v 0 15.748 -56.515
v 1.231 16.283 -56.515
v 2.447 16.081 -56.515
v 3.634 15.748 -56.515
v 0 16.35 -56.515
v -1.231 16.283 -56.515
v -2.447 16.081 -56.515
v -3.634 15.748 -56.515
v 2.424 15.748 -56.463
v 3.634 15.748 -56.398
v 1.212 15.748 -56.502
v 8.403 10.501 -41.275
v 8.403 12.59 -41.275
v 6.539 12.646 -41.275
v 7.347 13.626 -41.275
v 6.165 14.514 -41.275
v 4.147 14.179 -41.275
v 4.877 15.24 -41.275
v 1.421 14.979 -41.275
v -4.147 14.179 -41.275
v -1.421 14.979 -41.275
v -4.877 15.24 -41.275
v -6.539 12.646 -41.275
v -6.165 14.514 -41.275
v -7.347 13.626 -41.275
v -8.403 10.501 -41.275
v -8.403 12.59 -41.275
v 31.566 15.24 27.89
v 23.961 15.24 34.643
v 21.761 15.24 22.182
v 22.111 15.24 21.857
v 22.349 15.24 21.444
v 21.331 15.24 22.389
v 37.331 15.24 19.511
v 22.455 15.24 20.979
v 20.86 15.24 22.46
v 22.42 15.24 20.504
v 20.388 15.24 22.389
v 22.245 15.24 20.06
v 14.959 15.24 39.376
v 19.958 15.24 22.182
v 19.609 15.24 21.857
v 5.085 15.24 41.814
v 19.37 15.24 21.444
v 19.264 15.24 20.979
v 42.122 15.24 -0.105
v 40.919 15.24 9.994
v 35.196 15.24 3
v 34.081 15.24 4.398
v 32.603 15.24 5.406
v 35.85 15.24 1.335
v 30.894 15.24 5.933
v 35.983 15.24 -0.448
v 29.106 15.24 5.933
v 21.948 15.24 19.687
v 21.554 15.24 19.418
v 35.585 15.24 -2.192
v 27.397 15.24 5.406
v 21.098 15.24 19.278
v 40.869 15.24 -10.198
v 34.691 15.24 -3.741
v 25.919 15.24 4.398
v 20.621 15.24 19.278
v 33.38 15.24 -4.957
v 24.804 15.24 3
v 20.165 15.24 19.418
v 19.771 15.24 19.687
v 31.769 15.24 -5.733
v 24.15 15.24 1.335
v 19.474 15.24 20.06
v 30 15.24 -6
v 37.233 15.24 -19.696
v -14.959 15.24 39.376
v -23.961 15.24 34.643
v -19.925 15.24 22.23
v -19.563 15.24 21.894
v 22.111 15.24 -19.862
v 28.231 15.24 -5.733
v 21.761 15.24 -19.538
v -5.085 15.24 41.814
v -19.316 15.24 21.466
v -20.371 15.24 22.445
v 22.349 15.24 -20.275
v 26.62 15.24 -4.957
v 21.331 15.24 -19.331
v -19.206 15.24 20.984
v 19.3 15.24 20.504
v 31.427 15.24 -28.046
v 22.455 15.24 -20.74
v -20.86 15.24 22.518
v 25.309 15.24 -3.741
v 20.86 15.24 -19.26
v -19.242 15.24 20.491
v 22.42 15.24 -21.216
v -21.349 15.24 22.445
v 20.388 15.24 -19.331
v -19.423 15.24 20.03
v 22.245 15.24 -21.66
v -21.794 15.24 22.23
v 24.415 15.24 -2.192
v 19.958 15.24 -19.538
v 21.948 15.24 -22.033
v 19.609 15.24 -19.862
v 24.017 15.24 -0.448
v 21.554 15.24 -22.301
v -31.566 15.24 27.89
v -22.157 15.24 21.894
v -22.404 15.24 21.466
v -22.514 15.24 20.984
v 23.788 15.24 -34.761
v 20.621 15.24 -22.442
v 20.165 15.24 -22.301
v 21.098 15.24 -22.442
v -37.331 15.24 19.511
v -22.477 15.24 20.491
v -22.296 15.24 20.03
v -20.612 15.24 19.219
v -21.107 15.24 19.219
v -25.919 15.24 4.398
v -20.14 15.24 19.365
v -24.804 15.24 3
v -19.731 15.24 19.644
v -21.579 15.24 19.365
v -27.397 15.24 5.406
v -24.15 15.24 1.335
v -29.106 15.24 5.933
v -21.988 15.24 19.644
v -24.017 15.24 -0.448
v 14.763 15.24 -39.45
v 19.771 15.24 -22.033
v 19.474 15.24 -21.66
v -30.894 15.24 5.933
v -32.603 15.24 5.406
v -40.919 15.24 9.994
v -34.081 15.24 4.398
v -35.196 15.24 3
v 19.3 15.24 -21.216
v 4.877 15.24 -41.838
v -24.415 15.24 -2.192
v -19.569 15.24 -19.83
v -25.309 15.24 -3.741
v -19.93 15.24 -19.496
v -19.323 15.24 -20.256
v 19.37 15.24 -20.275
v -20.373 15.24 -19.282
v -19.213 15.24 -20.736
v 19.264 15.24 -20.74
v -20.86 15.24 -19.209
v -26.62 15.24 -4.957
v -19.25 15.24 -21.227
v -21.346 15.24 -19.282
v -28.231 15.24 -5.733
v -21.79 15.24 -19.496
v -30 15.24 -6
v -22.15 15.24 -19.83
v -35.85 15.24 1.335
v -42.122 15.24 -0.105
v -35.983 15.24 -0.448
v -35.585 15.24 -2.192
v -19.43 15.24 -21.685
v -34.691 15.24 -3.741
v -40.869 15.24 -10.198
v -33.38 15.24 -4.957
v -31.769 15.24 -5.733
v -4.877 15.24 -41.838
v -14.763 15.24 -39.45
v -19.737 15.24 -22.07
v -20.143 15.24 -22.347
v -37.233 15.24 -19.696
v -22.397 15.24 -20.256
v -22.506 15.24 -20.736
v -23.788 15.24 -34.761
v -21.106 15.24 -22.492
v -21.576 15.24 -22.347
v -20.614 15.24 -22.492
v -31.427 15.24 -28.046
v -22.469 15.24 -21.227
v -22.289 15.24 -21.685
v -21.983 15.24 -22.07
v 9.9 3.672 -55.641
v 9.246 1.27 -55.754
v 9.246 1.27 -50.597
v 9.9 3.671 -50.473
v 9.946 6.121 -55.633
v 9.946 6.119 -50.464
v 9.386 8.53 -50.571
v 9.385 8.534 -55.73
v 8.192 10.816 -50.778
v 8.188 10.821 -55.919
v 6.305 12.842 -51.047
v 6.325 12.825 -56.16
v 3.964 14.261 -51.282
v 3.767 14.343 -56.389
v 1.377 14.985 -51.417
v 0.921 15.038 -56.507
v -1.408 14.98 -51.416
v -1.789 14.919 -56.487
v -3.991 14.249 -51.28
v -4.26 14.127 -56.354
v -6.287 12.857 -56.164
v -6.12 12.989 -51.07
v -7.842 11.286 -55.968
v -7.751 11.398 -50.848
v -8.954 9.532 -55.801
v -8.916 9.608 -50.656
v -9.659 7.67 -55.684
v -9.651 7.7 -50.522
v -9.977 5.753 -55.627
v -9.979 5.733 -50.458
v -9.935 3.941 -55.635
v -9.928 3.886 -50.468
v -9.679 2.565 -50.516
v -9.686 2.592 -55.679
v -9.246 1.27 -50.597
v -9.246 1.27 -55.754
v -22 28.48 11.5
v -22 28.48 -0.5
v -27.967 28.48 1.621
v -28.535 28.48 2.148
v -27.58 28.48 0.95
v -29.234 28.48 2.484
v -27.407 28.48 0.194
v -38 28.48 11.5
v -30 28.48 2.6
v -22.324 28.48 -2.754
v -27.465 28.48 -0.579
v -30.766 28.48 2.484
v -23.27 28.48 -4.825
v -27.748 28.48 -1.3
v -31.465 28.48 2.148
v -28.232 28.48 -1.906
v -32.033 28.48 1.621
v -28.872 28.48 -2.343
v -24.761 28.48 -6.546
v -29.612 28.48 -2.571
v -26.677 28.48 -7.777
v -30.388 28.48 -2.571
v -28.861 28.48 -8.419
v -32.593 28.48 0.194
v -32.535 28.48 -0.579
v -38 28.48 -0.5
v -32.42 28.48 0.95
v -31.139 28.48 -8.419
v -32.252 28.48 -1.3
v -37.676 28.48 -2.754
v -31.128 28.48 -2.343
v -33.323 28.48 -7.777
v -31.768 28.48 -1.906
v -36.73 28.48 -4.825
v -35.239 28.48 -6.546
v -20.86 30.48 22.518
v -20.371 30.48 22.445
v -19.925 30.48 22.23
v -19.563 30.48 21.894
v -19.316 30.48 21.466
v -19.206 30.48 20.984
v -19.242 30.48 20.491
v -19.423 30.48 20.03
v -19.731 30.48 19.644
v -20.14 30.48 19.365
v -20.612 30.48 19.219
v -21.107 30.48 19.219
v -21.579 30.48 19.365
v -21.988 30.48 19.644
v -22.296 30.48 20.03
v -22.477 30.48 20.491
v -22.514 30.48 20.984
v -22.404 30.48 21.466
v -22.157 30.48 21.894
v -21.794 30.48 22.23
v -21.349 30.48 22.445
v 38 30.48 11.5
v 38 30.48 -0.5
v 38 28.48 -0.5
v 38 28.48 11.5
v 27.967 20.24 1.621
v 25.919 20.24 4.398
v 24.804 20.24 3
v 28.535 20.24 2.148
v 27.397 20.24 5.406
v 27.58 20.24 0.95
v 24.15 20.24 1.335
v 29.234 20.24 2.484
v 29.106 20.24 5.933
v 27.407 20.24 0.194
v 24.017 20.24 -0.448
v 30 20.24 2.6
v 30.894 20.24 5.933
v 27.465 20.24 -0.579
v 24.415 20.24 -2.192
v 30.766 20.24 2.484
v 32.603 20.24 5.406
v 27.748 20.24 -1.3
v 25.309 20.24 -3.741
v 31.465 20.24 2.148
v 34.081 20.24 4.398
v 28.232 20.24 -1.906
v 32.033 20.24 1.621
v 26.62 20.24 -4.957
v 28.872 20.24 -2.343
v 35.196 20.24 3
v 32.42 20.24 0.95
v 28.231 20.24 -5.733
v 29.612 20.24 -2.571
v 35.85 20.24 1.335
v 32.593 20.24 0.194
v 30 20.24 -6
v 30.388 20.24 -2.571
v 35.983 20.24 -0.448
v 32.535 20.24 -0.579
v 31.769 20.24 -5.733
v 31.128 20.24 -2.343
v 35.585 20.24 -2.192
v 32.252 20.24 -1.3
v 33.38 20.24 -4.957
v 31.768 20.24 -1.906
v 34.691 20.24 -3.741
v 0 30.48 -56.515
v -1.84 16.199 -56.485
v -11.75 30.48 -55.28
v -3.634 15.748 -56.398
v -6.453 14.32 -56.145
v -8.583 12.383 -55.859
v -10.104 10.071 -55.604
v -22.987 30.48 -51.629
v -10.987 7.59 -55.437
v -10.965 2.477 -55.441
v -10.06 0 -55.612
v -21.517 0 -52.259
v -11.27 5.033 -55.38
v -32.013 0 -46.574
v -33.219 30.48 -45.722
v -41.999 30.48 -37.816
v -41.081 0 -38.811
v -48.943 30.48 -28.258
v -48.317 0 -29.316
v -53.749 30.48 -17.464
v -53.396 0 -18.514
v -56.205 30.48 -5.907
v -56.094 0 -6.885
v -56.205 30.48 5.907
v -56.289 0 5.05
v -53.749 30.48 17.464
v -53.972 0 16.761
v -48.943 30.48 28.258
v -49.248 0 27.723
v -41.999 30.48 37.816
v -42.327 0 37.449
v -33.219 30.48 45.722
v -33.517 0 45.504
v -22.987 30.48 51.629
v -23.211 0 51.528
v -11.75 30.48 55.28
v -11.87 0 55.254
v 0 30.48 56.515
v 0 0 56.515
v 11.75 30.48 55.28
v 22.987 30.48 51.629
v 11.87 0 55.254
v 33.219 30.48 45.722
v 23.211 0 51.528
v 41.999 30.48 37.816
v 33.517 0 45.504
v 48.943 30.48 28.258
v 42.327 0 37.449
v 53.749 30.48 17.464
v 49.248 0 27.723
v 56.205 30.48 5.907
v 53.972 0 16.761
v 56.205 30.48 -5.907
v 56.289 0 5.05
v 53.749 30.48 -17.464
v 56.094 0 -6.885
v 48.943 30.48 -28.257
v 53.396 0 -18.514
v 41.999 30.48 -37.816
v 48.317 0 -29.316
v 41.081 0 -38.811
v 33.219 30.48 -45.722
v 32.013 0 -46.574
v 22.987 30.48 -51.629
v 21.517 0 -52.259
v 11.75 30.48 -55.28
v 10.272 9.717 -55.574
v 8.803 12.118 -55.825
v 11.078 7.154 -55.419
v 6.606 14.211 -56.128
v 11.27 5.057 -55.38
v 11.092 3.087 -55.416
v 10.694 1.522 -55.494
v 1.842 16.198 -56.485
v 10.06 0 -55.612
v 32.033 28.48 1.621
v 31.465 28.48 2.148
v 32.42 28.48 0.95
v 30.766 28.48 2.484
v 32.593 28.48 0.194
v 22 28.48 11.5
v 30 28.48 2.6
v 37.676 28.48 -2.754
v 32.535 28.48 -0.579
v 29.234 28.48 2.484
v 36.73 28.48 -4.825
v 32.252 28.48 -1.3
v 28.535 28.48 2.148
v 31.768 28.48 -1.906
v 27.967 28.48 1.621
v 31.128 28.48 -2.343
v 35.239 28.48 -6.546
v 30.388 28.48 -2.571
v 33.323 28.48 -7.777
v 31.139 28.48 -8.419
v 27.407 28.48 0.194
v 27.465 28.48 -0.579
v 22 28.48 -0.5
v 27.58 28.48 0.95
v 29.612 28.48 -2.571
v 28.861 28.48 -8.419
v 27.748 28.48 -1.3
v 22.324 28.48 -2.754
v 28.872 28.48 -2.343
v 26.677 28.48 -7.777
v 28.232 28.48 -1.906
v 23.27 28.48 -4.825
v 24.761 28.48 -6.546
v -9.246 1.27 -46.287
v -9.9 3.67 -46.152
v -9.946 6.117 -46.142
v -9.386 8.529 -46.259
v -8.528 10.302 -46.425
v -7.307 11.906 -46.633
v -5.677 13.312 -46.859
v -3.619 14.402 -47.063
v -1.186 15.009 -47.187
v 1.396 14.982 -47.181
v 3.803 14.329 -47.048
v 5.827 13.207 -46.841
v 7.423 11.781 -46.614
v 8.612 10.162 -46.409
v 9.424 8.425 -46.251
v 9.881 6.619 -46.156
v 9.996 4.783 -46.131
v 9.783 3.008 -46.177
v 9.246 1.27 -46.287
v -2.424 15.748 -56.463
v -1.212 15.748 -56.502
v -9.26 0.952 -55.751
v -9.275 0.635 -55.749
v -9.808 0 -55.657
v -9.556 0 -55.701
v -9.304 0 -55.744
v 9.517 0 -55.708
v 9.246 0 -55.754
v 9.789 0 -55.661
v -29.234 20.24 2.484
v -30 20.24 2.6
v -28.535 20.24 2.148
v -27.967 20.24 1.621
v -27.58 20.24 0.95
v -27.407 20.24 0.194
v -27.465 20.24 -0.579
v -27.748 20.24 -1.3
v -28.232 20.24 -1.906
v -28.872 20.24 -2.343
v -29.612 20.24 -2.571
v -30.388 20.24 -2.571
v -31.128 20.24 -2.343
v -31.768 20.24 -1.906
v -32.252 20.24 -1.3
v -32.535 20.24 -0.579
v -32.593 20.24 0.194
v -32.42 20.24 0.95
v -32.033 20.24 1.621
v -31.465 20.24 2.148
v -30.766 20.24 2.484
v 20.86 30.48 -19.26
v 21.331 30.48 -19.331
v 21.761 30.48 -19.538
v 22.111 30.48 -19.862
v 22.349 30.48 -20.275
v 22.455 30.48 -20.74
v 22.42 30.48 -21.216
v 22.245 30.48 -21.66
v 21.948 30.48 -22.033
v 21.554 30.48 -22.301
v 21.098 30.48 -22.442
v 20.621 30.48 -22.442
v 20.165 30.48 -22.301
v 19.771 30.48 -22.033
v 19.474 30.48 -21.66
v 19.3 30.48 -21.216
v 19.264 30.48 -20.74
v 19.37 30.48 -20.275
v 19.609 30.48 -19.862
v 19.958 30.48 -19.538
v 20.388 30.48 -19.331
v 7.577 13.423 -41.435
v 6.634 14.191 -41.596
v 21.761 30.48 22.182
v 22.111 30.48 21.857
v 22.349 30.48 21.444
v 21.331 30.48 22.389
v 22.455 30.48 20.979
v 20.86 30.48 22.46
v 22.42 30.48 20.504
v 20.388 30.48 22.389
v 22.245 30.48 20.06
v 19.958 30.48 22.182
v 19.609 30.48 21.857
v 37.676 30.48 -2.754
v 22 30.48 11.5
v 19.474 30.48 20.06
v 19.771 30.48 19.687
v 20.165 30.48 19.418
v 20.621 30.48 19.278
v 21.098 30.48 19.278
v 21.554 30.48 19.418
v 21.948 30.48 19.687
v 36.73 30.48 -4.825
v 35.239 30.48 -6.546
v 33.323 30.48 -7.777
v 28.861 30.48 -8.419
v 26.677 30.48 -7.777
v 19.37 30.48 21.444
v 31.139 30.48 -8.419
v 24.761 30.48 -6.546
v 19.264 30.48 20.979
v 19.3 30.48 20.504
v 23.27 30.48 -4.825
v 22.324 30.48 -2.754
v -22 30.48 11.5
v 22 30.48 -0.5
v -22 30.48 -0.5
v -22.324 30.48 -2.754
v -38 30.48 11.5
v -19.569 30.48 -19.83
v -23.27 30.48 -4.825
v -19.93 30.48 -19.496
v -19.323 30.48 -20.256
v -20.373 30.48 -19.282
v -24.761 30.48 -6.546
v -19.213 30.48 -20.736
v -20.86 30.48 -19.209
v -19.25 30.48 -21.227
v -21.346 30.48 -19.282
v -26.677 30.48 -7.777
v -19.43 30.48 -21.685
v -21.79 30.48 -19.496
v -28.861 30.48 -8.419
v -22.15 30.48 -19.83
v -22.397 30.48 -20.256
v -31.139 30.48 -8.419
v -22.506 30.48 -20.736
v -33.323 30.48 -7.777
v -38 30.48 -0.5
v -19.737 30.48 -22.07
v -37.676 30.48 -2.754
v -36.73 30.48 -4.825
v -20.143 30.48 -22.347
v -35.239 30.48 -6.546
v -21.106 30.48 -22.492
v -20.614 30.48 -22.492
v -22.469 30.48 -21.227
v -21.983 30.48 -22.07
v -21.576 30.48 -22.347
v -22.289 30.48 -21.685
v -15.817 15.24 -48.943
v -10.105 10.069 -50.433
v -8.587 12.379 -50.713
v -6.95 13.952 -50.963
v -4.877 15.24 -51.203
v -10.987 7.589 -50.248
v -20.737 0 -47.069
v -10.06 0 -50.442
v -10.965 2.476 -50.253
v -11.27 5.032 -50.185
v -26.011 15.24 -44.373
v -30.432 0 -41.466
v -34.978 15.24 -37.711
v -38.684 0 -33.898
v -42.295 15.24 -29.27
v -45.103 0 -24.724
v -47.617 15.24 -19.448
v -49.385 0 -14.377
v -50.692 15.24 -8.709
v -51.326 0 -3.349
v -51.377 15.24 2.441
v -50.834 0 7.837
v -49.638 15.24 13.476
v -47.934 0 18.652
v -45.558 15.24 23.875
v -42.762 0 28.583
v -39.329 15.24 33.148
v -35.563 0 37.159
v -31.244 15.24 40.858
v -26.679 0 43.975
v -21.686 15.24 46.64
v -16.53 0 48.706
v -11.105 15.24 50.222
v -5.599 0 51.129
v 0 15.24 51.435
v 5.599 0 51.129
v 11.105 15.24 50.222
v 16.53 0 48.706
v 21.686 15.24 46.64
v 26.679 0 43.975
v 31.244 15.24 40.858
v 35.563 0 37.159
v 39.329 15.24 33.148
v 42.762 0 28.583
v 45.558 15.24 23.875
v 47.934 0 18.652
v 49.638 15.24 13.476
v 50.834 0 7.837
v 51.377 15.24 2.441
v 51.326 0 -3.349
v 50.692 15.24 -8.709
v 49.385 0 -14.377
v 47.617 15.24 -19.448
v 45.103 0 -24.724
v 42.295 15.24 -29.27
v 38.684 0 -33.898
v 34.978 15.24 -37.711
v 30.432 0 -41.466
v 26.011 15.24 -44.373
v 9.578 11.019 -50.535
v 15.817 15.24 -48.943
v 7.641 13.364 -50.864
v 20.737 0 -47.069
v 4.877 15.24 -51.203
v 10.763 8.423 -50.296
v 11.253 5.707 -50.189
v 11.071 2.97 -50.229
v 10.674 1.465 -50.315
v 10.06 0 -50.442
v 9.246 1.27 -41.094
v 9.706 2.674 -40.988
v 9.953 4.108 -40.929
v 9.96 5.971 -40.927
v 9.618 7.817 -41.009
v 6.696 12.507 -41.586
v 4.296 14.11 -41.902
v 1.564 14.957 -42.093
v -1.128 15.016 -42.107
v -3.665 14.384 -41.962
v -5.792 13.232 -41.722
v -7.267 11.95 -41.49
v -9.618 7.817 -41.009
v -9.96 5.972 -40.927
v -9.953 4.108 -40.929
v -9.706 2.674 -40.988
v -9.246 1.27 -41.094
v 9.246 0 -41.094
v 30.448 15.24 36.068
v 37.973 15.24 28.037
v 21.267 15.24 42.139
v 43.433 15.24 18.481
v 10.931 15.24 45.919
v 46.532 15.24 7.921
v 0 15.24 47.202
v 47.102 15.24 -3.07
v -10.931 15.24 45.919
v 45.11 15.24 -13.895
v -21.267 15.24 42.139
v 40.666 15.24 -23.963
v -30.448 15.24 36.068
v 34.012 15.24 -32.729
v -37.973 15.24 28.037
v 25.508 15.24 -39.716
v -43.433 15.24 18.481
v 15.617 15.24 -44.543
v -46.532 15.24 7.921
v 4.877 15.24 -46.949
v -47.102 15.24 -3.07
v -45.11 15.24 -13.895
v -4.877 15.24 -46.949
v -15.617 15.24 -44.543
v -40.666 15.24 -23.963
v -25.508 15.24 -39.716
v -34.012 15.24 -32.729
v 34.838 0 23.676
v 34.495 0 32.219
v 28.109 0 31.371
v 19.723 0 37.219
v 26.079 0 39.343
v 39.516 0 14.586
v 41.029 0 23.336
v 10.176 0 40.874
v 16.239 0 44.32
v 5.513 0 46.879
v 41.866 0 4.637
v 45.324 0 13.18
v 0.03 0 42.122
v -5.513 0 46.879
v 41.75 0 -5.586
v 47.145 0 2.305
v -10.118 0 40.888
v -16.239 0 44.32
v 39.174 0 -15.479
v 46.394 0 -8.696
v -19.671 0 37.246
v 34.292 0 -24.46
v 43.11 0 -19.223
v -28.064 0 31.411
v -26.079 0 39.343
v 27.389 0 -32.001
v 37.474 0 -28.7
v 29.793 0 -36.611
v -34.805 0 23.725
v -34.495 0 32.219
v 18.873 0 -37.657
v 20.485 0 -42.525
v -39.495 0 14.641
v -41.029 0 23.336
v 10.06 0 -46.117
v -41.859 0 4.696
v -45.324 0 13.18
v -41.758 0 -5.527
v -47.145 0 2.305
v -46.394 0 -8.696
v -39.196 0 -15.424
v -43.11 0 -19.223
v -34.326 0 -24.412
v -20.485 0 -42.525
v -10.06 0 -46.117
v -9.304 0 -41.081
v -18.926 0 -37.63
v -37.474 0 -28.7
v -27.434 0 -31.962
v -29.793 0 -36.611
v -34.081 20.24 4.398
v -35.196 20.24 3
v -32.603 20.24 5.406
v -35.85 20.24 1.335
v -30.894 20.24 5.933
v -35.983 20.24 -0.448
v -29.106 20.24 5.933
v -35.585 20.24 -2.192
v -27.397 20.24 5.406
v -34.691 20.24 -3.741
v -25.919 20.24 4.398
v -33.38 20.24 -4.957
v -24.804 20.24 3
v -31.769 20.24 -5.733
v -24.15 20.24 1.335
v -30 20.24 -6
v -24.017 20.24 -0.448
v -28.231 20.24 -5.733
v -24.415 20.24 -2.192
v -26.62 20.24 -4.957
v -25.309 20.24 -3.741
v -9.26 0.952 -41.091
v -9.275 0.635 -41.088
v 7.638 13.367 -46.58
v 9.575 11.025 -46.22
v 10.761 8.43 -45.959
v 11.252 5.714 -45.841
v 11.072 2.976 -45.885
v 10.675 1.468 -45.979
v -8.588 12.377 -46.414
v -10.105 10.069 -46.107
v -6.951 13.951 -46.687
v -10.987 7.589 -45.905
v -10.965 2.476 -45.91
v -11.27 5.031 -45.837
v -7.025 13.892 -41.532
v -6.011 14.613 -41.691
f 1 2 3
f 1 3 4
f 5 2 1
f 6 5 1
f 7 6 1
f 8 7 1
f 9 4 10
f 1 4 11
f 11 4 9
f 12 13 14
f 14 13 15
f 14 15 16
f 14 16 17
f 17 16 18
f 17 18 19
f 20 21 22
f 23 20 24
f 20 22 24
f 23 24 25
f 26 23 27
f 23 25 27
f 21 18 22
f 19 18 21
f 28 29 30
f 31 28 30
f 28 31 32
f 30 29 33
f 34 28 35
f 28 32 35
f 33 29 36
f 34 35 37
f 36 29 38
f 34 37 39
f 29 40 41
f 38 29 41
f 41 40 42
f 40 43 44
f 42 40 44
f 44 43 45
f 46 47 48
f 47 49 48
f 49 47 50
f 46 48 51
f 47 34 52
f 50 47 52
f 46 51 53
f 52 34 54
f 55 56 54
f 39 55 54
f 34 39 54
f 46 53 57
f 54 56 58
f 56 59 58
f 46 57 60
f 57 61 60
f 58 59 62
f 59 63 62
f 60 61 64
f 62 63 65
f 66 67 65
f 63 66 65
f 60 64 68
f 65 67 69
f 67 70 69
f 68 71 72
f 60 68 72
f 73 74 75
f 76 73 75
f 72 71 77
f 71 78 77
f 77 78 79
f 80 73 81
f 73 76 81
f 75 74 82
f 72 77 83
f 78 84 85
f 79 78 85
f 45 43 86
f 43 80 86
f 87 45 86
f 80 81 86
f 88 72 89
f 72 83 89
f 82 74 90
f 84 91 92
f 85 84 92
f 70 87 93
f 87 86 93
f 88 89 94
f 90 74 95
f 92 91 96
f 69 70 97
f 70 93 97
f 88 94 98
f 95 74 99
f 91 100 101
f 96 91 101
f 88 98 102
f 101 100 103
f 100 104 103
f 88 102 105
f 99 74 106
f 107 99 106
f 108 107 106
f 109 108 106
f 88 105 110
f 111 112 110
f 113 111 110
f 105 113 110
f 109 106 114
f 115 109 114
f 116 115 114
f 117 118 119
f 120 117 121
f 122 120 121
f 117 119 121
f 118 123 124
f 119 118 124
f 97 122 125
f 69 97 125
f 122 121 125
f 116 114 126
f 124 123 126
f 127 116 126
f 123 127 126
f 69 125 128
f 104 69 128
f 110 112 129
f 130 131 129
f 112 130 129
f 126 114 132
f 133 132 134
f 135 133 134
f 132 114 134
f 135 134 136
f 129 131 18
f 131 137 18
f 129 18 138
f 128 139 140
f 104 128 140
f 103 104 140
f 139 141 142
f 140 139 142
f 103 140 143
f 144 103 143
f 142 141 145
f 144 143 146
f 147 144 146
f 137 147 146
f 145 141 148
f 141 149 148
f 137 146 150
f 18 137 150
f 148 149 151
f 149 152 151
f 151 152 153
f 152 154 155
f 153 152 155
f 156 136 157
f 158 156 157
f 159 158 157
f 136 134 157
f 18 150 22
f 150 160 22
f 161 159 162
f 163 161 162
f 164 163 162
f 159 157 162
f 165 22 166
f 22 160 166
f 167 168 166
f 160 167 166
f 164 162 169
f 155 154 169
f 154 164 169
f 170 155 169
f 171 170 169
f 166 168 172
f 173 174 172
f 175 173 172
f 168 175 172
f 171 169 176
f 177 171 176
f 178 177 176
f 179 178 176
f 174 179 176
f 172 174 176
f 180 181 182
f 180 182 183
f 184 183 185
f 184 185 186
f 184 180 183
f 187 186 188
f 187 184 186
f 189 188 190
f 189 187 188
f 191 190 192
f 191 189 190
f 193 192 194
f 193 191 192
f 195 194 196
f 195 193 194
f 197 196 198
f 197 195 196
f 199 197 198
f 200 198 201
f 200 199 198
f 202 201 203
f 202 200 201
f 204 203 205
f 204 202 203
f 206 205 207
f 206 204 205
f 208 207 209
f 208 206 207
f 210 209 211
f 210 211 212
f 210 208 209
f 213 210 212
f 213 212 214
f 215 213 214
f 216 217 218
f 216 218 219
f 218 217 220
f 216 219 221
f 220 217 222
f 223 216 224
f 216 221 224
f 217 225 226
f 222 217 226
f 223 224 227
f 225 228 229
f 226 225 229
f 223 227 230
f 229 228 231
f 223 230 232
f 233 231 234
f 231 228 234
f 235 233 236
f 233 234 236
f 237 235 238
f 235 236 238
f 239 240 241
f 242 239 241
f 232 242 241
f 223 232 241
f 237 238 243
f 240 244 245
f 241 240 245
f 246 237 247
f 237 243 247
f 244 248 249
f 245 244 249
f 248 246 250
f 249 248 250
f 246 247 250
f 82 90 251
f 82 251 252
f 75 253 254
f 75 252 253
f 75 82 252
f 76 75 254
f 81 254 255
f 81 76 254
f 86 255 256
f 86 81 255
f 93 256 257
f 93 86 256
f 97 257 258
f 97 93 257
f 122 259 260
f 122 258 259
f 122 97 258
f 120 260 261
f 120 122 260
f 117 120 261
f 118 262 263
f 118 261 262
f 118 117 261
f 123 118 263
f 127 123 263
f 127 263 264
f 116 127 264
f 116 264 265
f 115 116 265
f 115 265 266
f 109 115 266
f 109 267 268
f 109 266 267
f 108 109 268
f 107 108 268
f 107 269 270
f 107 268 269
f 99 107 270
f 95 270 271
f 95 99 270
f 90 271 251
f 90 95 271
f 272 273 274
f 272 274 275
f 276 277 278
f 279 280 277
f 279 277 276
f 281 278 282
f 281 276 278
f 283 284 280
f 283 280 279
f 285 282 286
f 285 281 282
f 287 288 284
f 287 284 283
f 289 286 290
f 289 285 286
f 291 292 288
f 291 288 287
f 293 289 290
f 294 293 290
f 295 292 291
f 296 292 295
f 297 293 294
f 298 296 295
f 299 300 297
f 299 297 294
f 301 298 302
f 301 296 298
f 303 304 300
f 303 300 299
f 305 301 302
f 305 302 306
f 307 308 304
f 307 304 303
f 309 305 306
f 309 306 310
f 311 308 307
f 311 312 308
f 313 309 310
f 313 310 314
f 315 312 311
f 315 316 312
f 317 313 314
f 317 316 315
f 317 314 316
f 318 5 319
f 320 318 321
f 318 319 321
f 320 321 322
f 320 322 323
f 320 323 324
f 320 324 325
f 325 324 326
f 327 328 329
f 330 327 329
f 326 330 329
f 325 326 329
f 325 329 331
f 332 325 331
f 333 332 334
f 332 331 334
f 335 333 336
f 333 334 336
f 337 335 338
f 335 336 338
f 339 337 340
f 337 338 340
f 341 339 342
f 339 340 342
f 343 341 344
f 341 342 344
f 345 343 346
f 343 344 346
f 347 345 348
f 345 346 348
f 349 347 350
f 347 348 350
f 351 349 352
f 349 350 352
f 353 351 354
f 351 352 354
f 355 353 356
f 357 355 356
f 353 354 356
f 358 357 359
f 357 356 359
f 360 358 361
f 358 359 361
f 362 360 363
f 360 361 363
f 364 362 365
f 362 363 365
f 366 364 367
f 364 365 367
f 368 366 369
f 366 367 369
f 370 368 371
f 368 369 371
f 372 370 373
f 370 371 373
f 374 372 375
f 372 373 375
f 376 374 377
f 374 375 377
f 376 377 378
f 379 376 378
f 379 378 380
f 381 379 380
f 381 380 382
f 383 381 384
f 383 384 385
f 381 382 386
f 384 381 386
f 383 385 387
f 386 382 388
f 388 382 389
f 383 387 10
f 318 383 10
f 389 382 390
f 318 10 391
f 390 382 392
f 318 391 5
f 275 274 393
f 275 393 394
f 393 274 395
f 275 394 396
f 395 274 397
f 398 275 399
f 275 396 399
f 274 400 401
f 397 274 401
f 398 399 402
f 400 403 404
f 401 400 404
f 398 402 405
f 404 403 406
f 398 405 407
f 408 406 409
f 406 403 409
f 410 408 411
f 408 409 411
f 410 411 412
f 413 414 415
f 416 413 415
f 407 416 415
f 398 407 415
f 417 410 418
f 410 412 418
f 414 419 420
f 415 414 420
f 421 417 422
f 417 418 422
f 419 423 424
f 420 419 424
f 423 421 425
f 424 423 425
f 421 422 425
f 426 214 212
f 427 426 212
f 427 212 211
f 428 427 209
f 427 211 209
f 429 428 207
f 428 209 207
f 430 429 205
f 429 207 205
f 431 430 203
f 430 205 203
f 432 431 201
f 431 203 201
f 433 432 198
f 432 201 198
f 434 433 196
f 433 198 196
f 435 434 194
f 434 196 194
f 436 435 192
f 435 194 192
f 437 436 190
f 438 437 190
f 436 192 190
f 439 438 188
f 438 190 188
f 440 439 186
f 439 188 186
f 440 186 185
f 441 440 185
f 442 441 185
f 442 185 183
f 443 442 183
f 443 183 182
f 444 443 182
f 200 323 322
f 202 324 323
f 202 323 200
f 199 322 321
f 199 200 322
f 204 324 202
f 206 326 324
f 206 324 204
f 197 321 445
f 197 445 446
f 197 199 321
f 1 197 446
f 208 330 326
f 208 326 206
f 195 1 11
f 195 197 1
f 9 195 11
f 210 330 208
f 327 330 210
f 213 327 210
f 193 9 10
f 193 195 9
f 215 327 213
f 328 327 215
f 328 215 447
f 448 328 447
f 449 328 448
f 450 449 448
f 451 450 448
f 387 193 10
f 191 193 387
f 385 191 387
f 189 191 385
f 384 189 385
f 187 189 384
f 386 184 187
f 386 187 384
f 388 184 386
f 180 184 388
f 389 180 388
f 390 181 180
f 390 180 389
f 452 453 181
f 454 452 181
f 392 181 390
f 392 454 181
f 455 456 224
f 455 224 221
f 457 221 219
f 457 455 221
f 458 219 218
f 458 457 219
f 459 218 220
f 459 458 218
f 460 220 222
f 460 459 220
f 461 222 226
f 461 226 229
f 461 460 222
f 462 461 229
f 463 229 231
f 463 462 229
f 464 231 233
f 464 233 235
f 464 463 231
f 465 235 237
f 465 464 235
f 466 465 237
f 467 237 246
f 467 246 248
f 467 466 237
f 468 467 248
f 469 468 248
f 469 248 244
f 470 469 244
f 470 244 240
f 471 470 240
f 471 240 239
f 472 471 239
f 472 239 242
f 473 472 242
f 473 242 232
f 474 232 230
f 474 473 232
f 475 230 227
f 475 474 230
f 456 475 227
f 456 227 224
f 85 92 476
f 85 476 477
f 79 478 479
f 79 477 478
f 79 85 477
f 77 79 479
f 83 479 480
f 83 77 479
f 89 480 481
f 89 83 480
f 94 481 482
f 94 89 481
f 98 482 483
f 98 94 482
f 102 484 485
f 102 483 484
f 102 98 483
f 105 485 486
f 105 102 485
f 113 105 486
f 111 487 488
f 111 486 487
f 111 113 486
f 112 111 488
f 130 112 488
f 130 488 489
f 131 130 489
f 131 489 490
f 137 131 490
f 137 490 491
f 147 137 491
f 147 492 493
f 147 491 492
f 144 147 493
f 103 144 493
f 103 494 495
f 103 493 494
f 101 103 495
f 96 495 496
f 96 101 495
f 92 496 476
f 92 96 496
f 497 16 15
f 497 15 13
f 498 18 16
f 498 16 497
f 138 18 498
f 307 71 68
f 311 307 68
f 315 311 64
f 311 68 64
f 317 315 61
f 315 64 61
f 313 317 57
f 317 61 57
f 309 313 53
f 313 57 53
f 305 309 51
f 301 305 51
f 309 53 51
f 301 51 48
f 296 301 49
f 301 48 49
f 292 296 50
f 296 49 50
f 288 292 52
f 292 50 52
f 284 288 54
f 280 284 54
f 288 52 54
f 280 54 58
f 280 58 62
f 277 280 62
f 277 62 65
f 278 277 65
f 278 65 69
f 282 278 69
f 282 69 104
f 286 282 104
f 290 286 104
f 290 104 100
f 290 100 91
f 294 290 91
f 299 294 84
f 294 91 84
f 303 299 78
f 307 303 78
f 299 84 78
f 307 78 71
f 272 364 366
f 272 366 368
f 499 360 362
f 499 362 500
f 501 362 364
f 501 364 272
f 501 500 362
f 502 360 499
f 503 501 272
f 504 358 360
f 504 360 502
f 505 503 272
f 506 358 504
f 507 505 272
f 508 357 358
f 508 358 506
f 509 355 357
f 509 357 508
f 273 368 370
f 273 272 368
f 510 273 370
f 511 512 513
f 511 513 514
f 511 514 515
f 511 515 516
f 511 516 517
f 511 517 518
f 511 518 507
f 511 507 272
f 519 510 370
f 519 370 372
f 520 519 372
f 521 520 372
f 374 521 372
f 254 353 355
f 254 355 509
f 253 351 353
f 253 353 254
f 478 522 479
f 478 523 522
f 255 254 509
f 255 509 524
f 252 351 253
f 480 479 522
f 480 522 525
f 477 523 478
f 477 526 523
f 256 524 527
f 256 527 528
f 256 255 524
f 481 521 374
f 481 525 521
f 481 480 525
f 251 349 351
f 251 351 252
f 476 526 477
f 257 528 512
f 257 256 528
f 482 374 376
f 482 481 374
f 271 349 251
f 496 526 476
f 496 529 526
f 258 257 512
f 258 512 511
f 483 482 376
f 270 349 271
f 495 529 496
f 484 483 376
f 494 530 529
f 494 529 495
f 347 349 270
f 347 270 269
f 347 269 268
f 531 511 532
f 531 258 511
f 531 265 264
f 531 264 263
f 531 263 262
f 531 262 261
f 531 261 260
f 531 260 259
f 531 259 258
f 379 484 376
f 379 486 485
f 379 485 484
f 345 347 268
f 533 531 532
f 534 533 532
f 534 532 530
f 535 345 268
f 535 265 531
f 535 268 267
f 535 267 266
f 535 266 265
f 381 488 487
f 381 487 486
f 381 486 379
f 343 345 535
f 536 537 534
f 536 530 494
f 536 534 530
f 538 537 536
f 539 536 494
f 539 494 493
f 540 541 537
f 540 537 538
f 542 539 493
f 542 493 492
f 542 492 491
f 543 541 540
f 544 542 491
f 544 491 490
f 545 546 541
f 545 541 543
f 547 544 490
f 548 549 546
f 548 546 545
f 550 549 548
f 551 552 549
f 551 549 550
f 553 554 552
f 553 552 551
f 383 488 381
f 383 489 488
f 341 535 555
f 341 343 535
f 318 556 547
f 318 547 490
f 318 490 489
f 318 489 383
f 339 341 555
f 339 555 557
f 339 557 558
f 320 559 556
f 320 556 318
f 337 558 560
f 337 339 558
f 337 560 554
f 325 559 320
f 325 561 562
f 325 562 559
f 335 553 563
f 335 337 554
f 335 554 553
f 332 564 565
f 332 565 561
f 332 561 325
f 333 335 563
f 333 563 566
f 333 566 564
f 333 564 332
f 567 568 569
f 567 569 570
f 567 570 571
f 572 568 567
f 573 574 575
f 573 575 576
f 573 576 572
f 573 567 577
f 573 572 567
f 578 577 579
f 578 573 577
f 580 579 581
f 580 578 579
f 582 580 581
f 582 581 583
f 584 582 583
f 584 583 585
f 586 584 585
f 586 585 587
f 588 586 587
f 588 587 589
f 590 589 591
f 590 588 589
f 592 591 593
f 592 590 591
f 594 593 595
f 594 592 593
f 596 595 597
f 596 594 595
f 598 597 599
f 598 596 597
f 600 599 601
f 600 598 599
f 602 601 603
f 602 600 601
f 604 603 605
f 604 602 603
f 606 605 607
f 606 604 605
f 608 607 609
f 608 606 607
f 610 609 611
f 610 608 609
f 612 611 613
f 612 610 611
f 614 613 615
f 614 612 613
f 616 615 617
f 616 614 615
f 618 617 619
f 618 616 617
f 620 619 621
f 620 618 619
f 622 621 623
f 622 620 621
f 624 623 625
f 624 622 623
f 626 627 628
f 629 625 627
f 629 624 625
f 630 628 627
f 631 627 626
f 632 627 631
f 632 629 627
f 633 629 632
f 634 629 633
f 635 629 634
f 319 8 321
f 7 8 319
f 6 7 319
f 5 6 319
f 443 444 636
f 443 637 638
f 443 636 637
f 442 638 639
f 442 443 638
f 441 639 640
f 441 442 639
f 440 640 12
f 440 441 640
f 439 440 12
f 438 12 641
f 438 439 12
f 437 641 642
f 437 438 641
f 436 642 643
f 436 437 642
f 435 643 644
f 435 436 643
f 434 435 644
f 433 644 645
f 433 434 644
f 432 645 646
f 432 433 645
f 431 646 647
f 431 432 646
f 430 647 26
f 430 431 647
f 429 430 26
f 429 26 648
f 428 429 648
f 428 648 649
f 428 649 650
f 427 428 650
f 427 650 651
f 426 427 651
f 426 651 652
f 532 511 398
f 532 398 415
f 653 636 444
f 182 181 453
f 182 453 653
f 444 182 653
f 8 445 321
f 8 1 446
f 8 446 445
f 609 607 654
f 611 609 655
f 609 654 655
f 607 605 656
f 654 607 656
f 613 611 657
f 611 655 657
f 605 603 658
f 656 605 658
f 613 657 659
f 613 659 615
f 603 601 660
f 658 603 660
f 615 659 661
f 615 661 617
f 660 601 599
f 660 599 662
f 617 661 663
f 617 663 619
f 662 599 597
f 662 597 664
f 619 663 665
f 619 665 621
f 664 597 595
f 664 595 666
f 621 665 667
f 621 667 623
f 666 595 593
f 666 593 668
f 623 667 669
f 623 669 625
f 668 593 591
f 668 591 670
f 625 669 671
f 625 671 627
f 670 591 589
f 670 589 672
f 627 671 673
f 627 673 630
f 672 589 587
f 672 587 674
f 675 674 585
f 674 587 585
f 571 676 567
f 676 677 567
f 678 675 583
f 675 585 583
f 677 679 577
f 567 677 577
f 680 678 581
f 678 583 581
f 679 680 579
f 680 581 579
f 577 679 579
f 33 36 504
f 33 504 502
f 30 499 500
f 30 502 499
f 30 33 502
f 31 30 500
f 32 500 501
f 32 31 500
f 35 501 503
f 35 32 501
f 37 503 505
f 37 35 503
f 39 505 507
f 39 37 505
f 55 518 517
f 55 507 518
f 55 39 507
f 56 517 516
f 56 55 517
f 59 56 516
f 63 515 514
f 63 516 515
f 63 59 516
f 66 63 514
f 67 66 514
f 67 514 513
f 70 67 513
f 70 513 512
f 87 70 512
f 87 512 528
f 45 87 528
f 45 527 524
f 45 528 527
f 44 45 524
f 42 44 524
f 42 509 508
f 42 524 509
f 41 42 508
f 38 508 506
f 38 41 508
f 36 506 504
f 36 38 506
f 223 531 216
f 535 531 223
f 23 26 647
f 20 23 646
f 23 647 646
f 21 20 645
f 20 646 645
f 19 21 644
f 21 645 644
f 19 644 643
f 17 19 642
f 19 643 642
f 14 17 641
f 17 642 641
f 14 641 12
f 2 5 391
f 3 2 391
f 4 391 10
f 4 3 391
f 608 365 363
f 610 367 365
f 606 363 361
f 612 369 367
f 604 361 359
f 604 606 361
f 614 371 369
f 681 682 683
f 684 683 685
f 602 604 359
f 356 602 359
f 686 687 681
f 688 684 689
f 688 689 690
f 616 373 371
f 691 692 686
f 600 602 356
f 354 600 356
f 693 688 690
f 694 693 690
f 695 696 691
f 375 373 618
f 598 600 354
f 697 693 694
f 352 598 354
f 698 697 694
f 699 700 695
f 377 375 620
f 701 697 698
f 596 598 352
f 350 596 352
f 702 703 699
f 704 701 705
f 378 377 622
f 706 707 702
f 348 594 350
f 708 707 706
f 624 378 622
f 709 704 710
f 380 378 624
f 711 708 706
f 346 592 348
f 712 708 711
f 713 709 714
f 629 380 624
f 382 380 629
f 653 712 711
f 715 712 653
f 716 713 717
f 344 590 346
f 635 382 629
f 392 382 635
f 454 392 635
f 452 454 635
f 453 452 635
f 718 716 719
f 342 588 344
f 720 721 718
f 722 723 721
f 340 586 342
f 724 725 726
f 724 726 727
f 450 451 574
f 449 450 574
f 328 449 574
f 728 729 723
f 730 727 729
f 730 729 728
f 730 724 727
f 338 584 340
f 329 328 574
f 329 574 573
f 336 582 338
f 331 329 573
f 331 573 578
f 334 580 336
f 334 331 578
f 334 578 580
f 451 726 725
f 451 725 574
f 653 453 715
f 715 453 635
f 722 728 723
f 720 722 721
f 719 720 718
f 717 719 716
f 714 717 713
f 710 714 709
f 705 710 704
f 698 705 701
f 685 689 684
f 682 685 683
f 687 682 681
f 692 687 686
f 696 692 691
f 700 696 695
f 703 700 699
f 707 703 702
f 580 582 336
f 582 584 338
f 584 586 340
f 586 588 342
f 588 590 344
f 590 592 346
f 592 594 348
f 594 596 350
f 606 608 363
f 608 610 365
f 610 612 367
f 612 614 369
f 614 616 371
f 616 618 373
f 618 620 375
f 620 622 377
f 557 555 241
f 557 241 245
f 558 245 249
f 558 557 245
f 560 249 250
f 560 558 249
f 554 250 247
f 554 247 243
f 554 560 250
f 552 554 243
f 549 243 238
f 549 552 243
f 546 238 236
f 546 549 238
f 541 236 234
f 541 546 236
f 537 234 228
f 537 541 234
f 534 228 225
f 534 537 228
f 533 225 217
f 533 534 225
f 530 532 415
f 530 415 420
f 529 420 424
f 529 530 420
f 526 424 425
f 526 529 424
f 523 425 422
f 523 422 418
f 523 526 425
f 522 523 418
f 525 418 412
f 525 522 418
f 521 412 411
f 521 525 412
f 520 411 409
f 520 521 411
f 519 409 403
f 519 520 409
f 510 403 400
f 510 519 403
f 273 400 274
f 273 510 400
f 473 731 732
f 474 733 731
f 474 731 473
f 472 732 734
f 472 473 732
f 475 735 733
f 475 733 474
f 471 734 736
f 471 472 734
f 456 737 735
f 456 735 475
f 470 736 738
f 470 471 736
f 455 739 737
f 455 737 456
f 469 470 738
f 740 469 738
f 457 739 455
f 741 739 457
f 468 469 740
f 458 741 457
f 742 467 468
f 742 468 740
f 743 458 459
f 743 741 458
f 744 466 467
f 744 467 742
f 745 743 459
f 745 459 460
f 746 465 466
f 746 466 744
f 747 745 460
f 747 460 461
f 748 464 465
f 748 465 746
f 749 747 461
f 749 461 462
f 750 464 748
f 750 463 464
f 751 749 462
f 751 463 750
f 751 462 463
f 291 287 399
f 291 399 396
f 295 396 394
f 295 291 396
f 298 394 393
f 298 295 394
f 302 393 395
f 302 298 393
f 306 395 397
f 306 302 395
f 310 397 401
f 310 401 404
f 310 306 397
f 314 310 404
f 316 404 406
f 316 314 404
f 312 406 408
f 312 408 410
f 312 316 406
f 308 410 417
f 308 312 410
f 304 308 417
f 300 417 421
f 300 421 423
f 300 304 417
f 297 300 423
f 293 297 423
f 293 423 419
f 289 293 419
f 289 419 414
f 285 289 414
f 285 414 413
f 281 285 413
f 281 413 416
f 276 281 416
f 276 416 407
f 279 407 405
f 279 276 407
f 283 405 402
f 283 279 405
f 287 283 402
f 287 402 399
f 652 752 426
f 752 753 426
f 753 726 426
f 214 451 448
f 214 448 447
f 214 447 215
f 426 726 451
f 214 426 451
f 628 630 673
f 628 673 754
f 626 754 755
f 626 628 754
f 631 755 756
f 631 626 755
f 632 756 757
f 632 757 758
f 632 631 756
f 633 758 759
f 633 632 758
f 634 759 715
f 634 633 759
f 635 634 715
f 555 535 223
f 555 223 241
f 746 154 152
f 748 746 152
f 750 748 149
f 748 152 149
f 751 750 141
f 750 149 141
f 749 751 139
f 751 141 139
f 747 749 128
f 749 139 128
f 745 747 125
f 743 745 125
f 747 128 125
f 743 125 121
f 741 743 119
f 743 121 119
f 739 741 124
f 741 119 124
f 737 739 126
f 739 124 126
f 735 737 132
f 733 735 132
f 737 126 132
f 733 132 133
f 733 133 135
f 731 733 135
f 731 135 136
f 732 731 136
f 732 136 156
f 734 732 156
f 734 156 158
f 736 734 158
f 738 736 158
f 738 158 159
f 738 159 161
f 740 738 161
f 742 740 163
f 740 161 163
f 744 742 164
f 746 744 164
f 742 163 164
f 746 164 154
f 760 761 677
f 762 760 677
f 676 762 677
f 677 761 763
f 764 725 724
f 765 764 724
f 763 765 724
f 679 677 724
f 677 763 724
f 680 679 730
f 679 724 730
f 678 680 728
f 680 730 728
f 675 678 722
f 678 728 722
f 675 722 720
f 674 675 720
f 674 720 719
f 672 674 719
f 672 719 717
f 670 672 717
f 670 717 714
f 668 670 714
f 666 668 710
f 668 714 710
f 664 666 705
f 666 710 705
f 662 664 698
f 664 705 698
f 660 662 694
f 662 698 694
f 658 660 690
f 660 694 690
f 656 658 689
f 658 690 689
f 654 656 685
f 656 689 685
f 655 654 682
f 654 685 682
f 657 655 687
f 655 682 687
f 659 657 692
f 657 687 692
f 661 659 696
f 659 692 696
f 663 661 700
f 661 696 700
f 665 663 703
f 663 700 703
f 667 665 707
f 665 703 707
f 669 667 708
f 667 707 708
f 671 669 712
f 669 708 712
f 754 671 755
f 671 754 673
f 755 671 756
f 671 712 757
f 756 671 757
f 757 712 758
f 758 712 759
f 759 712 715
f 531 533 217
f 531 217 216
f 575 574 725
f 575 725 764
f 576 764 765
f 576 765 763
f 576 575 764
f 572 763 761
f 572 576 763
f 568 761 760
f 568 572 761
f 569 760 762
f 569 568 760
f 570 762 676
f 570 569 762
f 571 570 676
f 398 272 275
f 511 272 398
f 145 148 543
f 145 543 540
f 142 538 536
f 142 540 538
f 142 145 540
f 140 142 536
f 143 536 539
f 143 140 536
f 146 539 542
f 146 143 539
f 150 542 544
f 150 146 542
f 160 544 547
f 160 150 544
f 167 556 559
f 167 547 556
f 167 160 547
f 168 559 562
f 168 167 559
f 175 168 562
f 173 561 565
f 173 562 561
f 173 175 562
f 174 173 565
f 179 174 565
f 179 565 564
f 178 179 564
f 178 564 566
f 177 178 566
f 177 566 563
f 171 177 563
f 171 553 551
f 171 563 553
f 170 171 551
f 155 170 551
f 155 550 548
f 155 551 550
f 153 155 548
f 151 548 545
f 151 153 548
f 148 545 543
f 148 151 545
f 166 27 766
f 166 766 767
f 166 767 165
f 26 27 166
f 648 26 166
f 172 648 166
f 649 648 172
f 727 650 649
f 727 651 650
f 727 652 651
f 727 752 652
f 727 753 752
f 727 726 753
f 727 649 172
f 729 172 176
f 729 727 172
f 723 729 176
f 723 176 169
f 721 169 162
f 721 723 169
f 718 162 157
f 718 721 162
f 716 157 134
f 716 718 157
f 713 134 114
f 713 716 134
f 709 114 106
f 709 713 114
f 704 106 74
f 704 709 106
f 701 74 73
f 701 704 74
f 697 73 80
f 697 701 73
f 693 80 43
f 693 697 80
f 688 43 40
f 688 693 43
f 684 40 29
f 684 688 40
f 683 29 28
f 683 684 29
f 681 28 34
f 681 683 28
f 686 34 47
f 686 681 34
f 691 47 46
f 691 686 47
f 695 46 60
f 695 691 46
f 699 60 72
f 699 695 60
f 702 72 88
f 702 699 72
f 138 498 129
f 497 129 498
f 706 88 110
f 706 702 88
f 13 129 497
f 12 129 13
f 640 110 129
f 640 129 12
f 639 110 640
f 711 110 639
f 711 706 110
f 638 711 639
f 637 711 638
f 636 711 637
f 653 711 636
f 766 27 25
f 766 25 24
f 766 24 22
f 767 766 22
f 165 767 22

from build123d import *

# Parameters (mm, degrees)
SKETCH2_R                = 56.515
SKETCH2_R_2              = 51.435
BOSS_EXTRUDE1_DEPTH      = 15.24
SKETCH2_R_3              = 47.201666667
SKETCH2_R_4              = 42.121666667
BOSS_EXTRUDE1_2_DEPTH    = 15.24
SKETCH3_R                = 56.515
BOSS_EXTRUDE2_DEPTH      = 15.24
CUT_EXTRUDE1_DEPTH       = 86.539001923
CUT_EXTRUDE1_DEPTH_BACK  = 86.539001923
SKETCH4_R                = 1.6
SKETCH4_R_2              = 1.65876763
SKETCH4_R_3              = 1.651
SKETCH14_R               = 10
CUT_EXTRUDE7_DEPTH       = 19.558
SKETCH16_W               = 1.27
SKETCH16_H               = 1.27
EXTRUDE_THIN1_DEPTH      = 15.24
SKETCH20_R               = 66.675
SKETCH20_R_2             = 56.515
CUT_EXTRUDE_THIN3_DEPTH  = 15.748
CUT_EXTRUDE12_DEPTH      = 15.748
SKETCH32_R               = 2.6
CUT_EXTRUDE18_DEPTH      = 2
CUT_EXTRUDE19_DEPTH      = 86.539002091
CUT_EXTRUDE19_DEPTH_BACK = 86.539002091
SKETCH33_R               = 2.6
SKETCH34_R               = 6
CUT_EXTRUDE20_DEPTH      = 5


with BuildPart() as part:
    # Sketch2 → Boss-Extrude1 (new body)
    with BuildSketch(Plane(origin=(0, 0, 0), x_dir=(1, 0, 0), z_dir=(0, 1, 0))):
        with Locations(Location((0, 0, 0), (0, 0, 90))):
            Circle(SKETCH2_R)
        with Locations(Location((0, 0, 0), (0, 0, 90))):
            Circle(SKETCH2_R_2, mode=Mode.SUBTRACT)
    extrude(amount=BOSS_EXTRUDE1_DEPTH)



with BuildPart() as body_2:
    # Sketch2 → Boss-Extrude1 2 (new body)
    with BuildSketch(Plane(origin=(0, 0, 0), x_dir=(1, 0, 0), z_dir=(0, 1, 0))):
        with Locations(Location((0, 0, 0), (0, 0, 90))):
            Circle(SKETCH2_R_3)
        with Locations(Location((0, 0, 0), (0, 0, 90))):
            Circle(SKETCH2_R_4, mode=Mode.SUBTRACT)
    extrude(amount=BOSS_EXTRUDE1_2_DEPTH)


with BuildPart() as part_1:
    add(part.part)

    add(body_2.part)  # Boss-Extrude2 merges body 2
    # Sketch3 → Boss-Extrude2 (add)
    with BuildSketch(Plane(origin=(0, 15.24, 0), x_dir=(1, 0, 0), z_dir=(0, 1, 0))):
        with Locations(Location((0, 0, 0), (0, 0, 90))):
            Circle(SKETCH3_R)
    extrude(amount=BOSS_EXTRUDE2_DEPTH)

    # Sketch4 → Cut-Extrude1 (cut, two sides: drawn at the far end of the back side and taken through both)
    with BuildSketch(Plane(origin=(0, 30.48, 0), x_dir=(1, 0, 0), z_dir=(0, 1, 0)).offset(-CUT_EXTRUDE1_DEPTH_BACK)):
        with Locations(Location((20.859650045, 20.859650045, 0), (0, 0, 270))):
            Circle(SKETCH4_R)
        with Locations(Location((20.859650045, -20.859650045, 0), (0, 0, 270))):
            Circle(SKETCH4_R)
        with Locations(Location((-20.859650045, -20.859650045, 0), (0, 0, 270))):
            Circle(SKETCH4_R_2)
        with Locations(Location((-20.859650045, 20.859650045, 0), (0, 0, 270))):
            Circle(SKETCH4_R_3)
    extrude(amount=CUT_EXTRUDE1_DEPTH + CUT_EXTRUDE1_DEPTH_BACK, mode=Mode.SUBTRACT)

    # Sketch14 → Cut-Extrude7 (cut)
    with BuildSketch(Plane.XY.offset(-56.515)):
        with Locations((0, 5.08)):
            Circle(SKETCH14_R)
    extrude(amount=CUT_EXTRUDE7_DEPTH, mode=Mode.SUBTRACT)

    # Sketch16 → Extrude-Thin1 (add)
    # profile 1 of 2: a face of its own
    with BuildSketch(Plane.XY.offset(-56.515)):
        with Locations((-0.635, 0.635)):
            Rectangle(SKETCH16_W, SKETCH16_H)
    # profile 2 of 2: a face of its own
    with BuildSketch(Plane.XY.offset(-56.515)):
        with BuildLine():
            Line((10.060144134, 0), (-10.060144134, 0))
            ThreePointArc((-10.060144134, 0), (0, 16.35), (10.060144134, 0))
        make_face()
        with BuildLine():
            Line((9.245750375, 1.27), (-9.245750375, 1.27))
            ThreePointArc((-9.245750375, 1.27), (0, 15.08), (9.245750375, 1.27))
        make_face(mode=Mode.SUBTRACT)
    extrude(amount=EXTRUDE_THIN1_DEPTH)

    # Sketch20 → Cut-Extrude-Thin3 (cut)
    with BuildSketch(Plane(origin=(0, 0, 0), x_dir=(-1, 0, 0), z_dir=(0, -1, 0))):
        Circle(SKETCH20_R)
        Circle(SKETCH20_R_2, mode=Mode.SUBTRACT)
    extrude(amount=-CUT_EXTRUDE_THIN3_DEPTH, mode=Mode.SUBTRACT)

    # Sketch21 → Cut-Extrude12 (cut)
    with BuildSketch(Plane.XY.offset(-56.515)):
        Polygon((-9.303733138, 0), (-9.245750375, 1.27), (9.245750375, 1.27), (9.245750375, 0), align=None)
    extrude(amount=CUT_EXTRUDE12_DEPTH, mode=Mode.SUBTRACT)

    # Sketch32 → Cut-Extrude18 (cut)
    # profile 1 of 2: a face of its own
    with BuildSketch(Plane(origin=(0, 30.48, 0), x_dir=(1, 0, 0), z_dir=(0, 1, 0))):
        with BuildLine():
            Line((-22, 0.5), (-22, -11.5))
            Line((-22, -11.5), (-38, -11.5))
            Line((-38, -11.5), (-38, 0.5))
            ThreePointArc((-38, 0.5), (-30, 8.5), (-22, 0.5))
        make_face()
        with Locations(Location((-30, 0, 0), (0, 0, 270))):
            Circle(SKETCH32_R, mode=Mode.SUBTRACT)
    # profile 2 of 2: a face of its own
    with BuildSketch(Plane(origin=(0, 30.48, 0), x_dir=(1, 0, 0), z_dir=(0, 1, 0))):
        with BuildLine():
            Line((38, 0.5), (38, -11.5))
            Line((38, -11.5), (22, -11.5))
            Line((22, -11.5), (22, 0.5))
            ThreePointArc((22, 0.5), (30, 8.5), (38, 0.5))
        make_face()
        with Locations(Location((30, 0, 0), (0, 0, 90))):
            Circle(SKETCH32_R, mode=Mode.SUBTRACT)
    extrude(amount=-CUT_EXTRUDE18_DEPTH, mode=Mode.SUBTRACT)

    # Sketch33 → Cut-Extrude19 (cut, two sides: drawn at the far end of the back side and taken through both)
    with BuildSketch(Plane(origin=(0, 30.48, 0), x_dir=(1, 0, 0), z_dir=(0, 1, 0)).offset(-CUT_EXTRUDE19_DEPTH_BACK)):
        with Locations(Location((-30, 0, 0), (0, 0, 270))):
            Circle(SKETCH33_R)
        with Locations(Location((30, 0, 0), (0, 0, 270))):
            Circle(SKETCH33_R)
    extrude(amount=CUT_EXTRUDE19_DEPTH + CUT_EXTRUDE19_DEPTH_BACK, mode=Mode.SUBTRACT)

    # Sketch34 → Cut-Extrude20 (cut)
    with BuildSketch(Plane(origin=(0, 15.24, 0), x_dir=(-1, 0, 0), z_dir=(0, -1, 0))):
        with Locations(Location((30, 0, 0), (0, 0, 90))):
            Circle(SKETCH34_R)
        with Locations(Location((-30, 0, 0), (0, 0, 90))):
            Circle(SKETCH34_R)
    extrude(amount=-CUT_EXTRUDE20_DEPTH, mode=Mode.SUBTRACT)


solid = part_1.part
